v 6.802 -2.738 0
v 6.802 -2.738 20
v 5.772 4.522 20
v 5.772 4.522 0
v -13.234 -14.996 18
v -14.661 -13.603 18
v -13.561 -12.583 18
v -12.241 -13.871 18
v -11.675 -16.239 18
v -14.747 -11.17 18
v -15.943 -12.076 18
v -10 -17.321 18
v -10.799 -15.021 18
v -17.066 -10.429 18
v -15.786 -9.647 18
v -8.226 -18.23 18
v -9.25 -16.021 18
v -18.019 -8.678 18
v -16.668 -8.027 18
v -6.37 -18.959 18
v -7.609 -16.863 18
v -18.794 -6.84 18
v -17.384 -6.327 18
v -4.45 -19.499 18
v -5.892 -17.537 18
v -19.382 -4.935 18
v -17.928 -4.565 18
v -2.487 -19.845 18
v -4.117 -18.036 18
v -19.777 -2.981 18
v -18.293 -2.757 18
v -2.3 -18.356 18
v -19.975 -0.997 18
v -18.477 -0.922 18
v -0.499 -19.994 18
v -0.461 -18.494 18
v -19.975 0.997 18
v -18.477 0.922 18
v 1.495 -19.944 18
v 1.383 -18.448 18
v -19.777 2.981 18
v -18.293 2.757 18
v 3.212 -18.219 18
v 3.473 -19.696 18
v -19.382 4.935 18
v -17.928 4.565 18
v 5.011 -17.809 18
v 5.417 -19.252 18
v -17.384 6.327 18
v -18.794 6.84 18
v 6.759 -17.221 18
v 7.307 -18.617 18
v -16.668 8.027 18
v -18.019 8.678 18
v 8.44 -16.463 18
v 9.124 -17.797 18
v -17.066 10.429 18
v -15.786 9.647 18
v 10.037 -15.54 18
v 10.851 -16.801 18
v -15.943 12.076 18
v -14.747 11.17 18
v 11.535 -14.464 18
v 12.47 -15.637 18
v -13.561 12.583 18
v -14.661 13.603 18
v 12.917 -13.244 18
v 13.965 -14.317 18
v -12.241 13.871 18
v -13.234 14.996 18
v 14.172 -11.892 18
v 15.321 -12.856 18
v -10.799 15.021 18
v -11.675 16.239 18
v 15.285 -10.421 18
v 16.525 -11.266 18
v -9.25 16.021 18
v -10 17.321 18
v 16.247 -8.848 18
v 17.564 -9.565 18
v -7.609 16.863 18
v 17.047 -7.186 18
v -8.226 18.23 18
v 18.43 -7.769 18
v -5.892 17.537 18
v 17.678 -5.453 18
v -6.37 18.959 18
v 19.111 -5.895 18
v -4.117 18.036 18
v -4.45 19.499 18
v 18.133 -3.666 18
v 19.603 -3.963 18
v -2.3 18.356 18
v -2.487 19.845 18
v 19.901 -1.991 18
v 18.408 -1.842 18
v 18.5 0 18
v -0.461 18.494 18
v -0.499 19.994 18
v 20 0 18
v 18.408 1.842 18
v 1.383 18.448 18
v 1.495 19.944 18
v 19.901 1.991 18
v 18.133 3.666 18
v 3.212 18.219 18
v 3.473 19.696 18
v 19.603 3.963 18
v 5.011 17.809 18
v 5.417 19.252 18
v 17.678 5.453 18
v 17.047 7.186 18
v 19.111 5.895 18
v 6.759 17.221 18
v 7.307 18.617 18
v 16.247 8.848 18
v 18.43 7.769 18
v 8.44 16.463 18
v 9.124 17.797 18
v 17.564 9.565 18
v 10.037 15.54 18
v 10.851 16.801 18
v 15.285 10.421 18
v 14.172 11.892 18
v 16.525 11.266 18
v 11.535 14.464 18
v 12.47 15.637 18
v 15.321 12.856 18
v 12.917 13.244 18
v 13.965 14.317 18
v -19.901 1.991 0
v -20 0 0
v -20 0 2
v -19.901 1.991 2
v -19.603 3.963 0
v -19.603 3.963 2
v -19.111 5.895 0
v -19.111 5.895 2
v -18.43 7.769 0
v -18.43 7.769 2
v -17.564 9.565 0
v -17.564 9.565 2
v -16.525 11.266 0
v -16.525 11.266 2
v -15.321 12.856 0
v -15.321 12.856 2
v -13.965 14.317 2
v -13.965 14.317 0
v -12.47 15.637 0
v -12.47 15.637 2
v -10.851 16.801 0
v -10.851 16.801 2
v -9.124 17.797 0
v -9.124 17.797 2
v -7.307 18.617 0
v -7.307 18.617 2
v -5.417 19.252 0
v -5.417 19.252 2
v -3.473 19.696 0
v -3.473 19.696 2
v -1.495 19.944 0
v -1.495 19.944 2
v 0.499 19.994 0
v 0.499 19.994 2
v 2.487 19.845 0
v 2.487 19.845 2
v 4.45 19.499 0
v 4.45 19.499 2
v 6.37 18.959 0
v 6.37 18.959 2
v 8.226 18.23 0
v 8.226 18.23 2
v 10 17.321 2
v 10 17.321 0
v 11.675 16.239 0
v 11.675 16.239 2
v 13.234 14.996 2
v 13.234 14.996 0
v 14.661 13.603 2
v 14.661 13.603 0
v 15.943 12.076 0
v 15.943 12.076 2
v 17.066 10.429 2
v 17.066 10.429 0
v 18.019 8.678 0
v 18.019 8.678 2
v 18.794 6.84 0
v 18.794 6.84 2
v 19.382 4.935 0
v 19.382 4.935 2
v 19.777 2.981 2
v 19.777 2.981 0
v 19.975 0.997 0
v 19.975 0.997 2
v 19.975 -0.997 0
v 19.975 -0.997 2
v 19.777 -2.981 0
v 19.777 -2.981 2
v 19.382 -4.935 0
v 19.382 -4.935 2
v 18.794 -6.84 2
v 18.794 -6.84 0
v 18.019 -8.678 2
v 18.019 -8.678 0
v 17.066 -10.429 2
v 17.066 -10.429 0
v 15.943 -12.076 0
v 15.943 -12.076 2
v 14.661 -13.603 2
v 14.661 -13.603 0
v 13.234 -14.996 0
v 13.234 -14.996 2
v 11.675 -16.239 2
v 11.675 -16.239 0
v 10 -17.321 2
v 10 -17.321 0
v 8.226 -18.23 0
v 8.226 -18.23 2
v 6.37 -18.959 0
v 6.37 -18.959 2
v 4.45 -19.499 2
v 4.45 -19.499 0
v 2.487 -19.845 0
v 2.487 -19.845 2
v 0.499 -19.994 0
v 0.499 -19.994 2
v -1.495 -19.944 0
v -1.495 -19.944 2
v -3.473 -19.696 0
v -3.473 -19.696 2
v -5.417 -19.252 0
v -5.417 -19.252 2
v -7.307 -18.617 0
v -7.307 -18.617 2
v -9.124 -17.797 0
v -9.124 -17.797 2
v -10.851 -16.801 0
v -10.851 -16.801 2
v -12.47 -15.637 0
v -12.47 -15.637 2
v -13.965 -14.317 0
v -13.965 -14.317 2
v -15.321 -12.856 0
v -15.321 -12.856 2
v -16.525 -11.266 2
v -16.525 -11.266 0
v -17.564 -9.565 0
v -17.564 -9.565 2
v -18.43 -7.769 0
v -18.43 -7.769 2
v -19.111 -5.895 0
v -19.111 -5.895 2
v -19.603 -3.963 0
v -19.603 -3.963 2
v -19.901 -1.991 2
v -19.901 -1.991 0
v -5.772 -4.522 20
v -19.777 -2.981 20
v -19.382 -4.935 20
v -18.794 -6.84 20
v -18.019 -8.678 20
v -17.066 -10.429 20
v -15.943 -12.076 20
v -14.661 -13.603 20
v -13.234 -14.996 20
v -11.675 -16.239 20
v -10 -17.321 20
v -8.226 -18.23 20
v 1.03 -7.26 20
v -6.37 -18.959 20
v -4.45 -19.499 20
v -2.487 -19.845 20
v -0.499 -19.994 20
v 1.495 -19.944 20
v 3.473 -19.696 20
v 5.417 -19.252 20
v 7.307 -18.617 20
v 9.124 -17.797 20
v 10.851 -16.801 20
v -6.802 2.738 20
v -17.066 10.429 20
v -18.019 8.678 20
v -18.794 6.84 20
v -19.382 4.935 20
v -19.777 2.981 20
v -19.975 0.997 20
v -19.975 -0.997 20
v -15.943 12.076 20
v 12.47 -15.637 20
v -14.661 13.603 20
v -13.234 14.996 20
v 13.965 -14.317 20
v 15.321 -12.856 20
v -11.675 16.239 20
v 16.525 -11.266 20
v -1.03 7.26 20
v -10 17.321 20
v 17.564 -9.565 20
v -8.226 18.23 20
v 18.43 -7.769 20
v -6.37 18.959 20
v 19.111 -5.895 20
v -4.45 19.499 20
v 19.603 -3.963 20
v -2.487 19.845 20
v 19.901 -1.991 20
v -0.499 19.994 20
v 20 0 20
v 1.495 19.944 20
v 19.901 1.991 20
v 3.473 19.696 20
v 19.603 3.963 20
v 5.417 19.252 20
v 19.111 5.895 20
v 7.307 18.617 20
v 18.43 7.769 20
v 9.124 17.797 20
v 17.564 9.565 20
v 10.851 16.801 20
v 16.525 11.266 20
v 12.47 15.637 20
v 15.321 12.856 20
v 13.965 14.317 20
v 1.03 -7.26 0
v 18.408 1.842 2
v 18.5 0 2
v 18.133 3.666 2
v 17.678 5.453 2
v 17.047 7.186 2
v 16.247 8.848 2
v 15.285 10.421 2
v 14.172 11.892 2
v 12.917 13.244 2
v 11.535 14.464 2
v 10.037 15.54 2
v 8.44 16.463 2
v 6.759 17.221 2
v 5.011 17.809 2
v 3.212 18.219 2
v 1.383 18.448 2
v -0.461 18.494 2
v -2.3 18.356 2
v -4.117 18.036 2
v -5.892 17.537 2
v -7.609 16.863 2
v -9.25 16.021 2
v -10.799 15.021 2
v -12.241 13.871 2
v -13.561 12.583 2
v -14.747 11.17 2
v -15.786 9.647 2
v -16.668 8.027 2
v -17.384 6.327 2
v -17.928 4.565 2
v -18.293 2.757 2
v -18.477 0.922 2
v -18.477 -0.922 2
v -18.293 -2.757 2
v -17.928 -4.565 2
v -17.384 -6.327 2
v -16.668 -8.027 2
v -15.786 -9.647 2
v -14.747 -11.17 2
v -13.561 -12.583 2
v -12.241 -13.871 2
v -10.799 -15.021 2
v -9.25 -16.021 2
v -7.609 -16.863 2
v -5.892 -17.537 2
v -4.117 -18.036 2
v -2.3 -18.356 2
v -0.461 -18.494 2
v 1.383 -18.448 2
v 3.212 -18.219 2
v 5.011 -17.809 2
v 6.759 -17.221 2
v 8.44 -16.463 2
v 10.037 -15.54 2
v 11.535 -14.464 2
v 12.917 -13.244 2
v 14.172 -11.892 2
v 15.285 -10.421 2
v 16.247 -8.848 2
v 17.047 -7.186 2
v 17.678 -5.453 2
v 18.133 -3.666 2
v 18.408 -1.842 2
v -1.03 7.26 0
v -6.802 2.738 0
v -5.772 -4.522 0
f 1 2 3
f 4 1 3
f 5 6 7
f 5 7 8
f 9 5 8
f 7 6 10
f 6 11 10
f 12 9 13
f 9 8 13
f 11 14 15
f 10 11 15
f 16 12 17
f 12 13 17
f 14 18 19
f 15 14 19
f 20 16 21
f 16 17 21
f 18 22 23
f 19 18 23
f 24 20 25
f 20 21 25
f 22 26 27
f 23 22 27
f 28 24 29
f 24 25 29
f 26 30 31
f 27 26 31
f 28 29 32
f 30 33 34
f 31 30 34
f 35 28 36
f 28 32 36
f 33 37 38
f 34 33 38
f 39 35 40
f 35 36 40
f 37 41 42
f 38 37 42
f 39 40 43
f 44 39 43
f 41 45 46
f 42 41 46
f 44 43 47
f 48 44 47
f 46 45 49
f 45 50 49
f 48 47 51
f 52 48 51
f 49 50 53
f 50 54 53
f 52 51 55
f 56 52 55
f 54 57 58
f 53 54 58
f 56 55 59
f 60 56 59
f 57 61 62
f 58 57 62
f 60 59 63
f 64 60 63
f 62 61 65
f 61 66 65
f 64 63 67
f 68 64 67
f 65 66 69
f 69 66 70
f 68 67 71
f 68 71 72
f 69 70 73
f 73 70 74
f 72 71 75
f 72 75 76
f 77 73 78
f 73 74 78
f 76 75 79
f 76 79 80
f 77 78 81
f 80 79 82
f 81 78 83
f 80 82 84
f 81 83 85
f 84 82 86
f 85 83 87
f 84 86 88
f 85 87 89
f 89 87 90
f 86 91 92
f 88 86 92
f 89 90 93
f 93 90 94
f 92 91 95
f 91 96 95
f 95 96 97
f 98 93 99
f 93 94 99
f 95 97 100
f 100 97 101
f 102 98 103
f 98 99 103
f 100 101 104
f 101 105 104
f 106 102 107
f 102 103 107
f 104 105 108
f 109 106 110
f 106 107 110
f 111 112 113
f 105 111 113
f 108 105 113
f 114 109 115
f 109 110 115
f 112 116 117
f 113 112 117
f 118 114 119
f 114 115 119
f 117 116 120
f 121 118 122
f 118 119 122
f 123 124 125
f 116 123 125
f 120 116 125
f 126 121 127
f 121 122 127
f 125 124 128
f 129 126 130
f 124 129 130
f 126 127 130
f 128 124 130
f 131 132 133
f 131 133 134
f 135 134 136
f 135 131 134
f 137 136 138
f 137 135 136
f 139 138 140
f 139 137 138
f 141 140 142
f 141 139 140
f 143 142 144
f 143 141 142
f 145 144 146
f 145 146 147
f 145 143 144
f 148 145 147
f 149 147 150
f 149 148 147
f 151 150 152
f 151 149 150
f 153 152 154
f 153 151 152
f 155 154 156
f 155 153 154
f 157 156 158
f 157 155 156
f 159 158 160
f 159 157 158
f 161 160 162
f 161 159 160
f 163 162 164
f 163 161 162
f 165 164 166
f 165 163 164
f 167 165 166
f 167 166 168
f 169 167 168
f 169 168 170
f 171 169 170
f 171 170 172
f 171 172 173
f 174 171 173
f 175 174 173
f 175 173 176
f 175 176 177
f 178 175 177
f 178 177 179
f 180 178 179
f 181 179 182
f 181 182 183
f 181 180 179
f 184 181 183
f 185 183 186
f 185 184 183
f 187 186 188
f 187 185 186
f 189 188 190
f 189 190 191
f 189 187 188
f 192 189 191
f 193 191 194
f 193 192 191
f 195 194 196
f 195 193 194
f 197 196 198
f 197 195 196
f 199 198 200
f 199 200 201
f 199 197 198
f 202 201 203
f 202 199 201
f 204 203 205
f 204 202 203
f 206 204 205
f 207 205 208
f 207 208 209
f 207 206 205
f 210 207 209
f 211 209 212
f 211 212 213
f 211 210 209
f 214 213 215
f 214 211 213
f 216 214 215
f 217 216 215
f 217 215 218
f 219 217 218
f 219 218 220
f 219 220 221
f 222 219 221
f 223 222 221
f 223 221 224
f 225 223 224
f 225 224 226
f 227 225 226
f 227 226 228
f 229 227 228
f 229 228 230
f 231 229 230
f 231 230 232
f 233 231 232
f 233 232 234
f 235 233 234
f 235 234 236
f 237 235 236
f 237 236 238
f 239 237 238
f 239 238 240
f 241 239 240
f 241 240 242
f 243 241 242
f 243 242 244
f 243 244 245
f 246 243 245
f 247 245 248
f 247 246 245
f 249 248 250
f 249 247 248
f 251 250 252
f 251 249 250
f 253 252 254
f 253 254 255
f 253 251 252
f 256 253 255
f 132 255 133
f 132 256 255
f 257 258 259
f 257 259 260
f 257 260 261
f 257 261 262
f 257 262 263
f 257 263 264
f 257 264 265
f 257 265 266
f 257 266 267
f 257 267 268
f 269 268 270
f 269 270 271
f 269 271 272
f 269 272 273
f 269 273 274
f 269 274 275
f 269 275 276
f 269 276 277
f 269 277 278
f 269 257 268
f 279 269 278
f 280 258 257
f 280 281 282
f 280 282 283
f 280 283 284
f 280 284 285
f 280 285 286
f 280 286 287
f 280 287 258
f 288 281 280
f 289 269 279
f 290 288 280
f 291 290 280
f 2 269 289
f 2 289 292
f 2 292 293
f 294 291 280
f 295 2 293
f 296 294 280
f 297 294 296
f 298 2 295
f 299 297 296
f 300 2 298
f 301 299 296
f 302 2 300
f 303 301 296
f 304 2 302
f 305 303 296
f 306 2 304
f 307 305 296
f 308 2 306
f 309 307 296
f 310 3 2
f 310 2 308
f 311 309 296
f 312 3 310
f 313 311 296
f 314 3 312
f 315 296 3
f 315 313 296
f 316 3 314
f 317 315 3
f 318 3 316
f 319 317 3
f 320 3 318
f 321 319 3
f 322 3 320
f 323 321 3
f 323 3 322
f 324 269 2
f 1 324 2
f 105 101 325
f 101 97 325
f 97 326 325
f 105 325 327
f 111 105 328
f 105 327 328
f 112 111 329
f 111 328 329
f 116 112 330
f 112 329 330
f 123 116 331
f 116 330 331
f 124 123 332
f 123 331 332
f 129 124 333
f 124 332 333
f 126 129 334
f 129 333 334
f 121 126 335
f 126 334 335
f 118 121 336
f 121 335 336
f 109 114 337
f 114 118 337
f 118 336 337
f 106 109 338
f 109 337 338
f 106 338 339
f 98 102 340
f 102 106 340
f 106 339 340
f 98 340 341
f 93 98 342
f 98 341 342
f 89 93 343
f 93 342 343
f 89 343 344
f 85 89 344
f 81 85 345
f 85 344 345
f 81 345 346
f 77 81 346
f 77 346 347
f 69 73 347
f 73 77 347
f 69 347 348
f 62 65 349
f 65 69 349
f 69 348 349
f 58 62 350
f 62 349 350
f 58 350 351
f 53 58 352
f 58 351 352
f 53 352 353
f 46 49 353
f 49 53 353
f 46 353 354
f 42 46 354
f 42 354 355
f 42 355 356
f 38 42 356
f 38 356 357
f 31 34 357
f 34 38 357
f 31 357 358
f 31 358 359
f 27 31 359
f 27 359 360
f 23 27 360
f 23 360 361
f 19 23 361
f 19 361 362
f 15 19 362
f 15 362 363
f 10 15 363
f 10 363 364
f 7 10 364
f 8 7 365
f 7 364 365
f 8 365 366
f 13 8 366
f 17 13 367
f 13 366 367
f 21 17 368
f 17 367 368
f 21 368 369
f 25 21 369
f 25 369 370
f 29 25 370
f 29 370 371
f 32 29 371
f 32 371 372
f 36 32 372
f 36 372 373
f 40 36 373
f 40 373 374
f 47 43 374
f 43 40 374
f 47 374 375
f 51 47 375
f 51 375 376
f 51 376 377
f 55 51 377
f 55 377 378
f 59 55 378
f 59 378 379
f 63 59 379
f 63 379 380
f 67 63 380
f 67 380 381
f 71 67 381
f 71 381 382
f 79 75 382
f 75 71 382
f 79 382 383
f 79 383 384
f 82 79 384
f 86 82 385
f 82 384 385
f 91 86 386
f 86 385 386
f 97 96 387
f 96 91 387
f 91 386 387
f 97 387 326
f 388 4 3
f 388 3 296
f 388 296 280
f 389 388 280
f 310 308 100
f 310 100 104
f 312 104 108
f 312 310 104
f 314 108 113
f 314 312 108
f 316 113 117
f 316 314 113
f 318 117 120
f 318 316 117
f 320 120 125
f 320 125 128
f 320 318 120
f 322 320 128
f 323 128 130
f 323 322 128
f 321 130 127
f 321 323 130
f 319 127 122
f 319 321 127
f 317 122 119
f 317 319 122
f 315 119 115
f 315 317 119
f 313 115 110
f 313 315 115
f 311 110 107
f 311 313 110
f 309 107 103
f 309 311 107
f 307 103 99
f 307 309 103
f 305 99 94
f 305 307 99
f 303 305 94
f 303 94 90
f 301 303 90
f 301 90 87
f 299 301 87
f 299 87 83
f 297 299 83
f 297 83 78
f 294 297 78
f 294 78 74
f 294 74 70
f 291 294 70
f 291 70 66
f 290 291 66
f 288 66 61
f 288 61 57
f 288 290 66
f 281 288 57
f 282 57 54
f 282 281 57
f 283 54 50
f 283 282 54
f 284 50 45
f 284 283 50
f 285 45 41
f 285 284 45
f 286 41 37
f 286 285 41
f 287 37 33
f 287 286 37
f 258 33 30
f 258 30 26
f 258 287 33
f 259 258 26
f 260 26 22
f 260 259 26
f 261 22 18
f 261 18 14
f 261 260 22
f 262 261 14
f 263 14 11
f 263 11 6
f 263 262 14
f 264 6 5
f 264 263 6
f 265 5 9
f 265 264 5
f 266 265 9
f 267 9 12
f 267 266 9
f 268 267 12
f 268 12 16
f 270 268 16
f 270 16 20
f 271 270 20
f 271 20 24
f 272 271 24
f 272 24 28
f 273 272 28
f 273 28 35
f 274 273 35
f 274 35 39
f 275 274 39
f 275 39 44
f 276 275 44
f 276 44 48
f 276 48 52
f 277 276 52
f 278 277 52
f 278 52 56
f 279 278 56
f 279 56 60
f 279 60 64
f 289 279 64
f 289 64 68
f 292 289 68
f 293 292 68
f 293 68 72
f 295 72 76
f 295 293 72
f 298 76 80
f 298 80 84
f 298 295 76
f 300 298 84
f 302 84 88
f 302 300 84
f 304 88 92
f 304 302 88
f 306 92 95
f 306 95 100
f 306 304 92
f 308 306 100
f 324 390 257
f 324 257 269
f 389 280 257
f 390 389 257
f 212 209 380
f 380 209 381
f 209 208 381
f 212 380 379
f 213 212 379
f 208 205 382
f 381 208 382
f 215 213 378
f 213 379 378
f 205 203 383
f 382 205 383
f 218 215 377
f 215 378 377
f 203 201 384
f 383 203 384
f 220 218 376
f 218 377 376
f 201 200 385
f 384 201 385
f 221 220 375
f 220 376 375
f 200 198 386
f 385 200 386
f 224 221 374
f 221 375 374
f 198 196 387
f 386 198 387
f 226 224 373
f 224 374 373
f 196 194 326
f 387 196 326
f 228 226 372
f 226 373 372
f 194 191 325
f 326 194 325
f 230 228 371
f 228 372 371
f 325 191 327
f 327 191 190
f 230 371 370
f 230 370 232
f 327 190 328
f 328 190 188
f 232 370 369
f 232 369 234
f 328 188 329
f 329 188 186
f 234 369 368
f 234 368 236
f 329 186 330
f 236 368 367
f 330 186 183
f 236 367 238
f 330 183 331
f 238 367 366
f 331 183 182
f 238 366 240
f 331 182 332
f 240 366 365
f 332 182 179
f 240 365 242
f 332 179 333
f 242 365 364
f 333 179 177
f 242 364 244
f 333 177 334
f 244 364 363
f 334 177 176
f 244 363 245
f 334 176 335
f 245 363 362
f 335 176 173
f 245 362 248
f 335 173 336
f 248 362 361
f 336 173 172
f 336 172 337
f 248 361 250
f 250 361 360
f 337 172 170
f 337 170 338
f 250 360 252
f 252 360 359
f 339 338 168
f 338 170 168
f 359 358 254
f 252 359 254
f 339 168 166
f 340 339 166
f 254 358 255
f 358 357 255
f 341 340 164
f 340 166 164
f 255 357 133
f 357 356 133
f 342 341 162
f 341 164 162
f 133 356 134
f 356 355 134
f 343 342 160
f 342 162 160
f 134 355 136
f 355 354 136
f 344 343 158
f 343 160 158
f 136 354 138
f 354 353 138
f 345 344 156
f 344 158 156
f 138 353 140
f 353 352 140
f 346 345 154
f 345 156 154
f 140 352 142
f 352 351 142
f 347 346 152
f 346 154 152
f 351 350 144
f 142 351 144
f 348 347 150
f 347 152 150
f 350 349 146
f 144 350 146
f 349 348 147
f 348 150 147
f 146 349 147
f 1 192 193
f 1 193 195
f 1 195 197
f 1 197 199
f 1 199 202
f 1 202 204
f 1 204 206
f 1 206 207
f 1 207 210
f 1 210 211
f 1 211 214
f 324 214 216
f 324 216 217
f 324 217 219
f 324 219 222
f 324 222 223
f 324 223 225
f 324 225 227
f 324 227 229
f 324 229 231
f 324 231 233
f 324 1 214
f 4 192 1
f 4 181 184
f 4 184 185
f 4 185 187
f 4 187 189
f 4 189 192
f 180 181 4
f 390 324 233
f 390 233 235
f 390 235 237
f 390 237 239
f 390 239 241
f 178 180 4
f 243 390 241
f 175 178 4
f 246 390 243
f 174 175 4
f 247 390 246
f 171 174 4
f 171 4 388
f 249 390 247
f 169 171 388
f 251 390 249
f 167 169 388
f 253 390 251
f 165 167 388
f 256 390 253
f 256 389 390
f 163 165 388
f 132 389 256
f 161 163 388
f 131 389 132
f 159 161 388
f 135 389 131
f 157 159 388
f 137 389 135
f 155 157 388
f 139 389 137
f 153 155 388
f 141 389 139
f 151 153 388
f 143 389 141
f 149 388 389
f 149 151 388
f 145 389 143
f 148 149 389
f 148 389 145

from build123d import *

# Parameters (mm, degrees)
SKETCH1_R           = 18.5
BOSS_EXTRUDE1_DEPTH = 20
SKETCH2_R           = 20
BOSS_EXTRUDE2_DEPTH = 2
SKETCH3_R           = 20
BOSS_EXTRUDE3_DEPTH = 2
CUT_EXTRUDE1_DEPTH  = 21


with BuildPart() as part:
    # Sketch1 → Boss-Extrude1 (new body)
    with BuildSketch(Plane.XY):
        Circle(SKETCH1_R)
    extrude(amount=BOSS_EXTRUDE1_DEPTH)

    # Sketch2 → Boss-Extrude2 (add)
    with BuildSketch(Plane.XY.offset(20)):
        Circle(SKETCH2_R)
    extrude(amount=-BOSS_EXTRUDE2_DEPTH)

    # Sketch3 → Boss-Extrude3 (add)
    with BuildSketch(Plane(origin=(0, 0, 0), x_dir=(-1, 0, 0), z_dir=(0, 0, -1))):
        Circle(SKETCH3_R)
    extrude(amount=-BOSS_EXTRUDE3_DEPTH)

    # Sketch4 → Cut-Extrude1 (cut, through all)
    with BuildSketch(Plane.XY.offset(20)):
        Polygon((5.772232155, 4.521578185), (-1.029685496, 7.259688775), (-6.801917651, 2.73811059), (-5.772232155, -4.521578185), (1.029685496, -7.259688775), (6.801917651, -2.73811059), align=None)
    extrude(amount=-CUT_EXTRUDE1_DEPTH, mode=Mode.SUBTRACT)


solid = part.part
